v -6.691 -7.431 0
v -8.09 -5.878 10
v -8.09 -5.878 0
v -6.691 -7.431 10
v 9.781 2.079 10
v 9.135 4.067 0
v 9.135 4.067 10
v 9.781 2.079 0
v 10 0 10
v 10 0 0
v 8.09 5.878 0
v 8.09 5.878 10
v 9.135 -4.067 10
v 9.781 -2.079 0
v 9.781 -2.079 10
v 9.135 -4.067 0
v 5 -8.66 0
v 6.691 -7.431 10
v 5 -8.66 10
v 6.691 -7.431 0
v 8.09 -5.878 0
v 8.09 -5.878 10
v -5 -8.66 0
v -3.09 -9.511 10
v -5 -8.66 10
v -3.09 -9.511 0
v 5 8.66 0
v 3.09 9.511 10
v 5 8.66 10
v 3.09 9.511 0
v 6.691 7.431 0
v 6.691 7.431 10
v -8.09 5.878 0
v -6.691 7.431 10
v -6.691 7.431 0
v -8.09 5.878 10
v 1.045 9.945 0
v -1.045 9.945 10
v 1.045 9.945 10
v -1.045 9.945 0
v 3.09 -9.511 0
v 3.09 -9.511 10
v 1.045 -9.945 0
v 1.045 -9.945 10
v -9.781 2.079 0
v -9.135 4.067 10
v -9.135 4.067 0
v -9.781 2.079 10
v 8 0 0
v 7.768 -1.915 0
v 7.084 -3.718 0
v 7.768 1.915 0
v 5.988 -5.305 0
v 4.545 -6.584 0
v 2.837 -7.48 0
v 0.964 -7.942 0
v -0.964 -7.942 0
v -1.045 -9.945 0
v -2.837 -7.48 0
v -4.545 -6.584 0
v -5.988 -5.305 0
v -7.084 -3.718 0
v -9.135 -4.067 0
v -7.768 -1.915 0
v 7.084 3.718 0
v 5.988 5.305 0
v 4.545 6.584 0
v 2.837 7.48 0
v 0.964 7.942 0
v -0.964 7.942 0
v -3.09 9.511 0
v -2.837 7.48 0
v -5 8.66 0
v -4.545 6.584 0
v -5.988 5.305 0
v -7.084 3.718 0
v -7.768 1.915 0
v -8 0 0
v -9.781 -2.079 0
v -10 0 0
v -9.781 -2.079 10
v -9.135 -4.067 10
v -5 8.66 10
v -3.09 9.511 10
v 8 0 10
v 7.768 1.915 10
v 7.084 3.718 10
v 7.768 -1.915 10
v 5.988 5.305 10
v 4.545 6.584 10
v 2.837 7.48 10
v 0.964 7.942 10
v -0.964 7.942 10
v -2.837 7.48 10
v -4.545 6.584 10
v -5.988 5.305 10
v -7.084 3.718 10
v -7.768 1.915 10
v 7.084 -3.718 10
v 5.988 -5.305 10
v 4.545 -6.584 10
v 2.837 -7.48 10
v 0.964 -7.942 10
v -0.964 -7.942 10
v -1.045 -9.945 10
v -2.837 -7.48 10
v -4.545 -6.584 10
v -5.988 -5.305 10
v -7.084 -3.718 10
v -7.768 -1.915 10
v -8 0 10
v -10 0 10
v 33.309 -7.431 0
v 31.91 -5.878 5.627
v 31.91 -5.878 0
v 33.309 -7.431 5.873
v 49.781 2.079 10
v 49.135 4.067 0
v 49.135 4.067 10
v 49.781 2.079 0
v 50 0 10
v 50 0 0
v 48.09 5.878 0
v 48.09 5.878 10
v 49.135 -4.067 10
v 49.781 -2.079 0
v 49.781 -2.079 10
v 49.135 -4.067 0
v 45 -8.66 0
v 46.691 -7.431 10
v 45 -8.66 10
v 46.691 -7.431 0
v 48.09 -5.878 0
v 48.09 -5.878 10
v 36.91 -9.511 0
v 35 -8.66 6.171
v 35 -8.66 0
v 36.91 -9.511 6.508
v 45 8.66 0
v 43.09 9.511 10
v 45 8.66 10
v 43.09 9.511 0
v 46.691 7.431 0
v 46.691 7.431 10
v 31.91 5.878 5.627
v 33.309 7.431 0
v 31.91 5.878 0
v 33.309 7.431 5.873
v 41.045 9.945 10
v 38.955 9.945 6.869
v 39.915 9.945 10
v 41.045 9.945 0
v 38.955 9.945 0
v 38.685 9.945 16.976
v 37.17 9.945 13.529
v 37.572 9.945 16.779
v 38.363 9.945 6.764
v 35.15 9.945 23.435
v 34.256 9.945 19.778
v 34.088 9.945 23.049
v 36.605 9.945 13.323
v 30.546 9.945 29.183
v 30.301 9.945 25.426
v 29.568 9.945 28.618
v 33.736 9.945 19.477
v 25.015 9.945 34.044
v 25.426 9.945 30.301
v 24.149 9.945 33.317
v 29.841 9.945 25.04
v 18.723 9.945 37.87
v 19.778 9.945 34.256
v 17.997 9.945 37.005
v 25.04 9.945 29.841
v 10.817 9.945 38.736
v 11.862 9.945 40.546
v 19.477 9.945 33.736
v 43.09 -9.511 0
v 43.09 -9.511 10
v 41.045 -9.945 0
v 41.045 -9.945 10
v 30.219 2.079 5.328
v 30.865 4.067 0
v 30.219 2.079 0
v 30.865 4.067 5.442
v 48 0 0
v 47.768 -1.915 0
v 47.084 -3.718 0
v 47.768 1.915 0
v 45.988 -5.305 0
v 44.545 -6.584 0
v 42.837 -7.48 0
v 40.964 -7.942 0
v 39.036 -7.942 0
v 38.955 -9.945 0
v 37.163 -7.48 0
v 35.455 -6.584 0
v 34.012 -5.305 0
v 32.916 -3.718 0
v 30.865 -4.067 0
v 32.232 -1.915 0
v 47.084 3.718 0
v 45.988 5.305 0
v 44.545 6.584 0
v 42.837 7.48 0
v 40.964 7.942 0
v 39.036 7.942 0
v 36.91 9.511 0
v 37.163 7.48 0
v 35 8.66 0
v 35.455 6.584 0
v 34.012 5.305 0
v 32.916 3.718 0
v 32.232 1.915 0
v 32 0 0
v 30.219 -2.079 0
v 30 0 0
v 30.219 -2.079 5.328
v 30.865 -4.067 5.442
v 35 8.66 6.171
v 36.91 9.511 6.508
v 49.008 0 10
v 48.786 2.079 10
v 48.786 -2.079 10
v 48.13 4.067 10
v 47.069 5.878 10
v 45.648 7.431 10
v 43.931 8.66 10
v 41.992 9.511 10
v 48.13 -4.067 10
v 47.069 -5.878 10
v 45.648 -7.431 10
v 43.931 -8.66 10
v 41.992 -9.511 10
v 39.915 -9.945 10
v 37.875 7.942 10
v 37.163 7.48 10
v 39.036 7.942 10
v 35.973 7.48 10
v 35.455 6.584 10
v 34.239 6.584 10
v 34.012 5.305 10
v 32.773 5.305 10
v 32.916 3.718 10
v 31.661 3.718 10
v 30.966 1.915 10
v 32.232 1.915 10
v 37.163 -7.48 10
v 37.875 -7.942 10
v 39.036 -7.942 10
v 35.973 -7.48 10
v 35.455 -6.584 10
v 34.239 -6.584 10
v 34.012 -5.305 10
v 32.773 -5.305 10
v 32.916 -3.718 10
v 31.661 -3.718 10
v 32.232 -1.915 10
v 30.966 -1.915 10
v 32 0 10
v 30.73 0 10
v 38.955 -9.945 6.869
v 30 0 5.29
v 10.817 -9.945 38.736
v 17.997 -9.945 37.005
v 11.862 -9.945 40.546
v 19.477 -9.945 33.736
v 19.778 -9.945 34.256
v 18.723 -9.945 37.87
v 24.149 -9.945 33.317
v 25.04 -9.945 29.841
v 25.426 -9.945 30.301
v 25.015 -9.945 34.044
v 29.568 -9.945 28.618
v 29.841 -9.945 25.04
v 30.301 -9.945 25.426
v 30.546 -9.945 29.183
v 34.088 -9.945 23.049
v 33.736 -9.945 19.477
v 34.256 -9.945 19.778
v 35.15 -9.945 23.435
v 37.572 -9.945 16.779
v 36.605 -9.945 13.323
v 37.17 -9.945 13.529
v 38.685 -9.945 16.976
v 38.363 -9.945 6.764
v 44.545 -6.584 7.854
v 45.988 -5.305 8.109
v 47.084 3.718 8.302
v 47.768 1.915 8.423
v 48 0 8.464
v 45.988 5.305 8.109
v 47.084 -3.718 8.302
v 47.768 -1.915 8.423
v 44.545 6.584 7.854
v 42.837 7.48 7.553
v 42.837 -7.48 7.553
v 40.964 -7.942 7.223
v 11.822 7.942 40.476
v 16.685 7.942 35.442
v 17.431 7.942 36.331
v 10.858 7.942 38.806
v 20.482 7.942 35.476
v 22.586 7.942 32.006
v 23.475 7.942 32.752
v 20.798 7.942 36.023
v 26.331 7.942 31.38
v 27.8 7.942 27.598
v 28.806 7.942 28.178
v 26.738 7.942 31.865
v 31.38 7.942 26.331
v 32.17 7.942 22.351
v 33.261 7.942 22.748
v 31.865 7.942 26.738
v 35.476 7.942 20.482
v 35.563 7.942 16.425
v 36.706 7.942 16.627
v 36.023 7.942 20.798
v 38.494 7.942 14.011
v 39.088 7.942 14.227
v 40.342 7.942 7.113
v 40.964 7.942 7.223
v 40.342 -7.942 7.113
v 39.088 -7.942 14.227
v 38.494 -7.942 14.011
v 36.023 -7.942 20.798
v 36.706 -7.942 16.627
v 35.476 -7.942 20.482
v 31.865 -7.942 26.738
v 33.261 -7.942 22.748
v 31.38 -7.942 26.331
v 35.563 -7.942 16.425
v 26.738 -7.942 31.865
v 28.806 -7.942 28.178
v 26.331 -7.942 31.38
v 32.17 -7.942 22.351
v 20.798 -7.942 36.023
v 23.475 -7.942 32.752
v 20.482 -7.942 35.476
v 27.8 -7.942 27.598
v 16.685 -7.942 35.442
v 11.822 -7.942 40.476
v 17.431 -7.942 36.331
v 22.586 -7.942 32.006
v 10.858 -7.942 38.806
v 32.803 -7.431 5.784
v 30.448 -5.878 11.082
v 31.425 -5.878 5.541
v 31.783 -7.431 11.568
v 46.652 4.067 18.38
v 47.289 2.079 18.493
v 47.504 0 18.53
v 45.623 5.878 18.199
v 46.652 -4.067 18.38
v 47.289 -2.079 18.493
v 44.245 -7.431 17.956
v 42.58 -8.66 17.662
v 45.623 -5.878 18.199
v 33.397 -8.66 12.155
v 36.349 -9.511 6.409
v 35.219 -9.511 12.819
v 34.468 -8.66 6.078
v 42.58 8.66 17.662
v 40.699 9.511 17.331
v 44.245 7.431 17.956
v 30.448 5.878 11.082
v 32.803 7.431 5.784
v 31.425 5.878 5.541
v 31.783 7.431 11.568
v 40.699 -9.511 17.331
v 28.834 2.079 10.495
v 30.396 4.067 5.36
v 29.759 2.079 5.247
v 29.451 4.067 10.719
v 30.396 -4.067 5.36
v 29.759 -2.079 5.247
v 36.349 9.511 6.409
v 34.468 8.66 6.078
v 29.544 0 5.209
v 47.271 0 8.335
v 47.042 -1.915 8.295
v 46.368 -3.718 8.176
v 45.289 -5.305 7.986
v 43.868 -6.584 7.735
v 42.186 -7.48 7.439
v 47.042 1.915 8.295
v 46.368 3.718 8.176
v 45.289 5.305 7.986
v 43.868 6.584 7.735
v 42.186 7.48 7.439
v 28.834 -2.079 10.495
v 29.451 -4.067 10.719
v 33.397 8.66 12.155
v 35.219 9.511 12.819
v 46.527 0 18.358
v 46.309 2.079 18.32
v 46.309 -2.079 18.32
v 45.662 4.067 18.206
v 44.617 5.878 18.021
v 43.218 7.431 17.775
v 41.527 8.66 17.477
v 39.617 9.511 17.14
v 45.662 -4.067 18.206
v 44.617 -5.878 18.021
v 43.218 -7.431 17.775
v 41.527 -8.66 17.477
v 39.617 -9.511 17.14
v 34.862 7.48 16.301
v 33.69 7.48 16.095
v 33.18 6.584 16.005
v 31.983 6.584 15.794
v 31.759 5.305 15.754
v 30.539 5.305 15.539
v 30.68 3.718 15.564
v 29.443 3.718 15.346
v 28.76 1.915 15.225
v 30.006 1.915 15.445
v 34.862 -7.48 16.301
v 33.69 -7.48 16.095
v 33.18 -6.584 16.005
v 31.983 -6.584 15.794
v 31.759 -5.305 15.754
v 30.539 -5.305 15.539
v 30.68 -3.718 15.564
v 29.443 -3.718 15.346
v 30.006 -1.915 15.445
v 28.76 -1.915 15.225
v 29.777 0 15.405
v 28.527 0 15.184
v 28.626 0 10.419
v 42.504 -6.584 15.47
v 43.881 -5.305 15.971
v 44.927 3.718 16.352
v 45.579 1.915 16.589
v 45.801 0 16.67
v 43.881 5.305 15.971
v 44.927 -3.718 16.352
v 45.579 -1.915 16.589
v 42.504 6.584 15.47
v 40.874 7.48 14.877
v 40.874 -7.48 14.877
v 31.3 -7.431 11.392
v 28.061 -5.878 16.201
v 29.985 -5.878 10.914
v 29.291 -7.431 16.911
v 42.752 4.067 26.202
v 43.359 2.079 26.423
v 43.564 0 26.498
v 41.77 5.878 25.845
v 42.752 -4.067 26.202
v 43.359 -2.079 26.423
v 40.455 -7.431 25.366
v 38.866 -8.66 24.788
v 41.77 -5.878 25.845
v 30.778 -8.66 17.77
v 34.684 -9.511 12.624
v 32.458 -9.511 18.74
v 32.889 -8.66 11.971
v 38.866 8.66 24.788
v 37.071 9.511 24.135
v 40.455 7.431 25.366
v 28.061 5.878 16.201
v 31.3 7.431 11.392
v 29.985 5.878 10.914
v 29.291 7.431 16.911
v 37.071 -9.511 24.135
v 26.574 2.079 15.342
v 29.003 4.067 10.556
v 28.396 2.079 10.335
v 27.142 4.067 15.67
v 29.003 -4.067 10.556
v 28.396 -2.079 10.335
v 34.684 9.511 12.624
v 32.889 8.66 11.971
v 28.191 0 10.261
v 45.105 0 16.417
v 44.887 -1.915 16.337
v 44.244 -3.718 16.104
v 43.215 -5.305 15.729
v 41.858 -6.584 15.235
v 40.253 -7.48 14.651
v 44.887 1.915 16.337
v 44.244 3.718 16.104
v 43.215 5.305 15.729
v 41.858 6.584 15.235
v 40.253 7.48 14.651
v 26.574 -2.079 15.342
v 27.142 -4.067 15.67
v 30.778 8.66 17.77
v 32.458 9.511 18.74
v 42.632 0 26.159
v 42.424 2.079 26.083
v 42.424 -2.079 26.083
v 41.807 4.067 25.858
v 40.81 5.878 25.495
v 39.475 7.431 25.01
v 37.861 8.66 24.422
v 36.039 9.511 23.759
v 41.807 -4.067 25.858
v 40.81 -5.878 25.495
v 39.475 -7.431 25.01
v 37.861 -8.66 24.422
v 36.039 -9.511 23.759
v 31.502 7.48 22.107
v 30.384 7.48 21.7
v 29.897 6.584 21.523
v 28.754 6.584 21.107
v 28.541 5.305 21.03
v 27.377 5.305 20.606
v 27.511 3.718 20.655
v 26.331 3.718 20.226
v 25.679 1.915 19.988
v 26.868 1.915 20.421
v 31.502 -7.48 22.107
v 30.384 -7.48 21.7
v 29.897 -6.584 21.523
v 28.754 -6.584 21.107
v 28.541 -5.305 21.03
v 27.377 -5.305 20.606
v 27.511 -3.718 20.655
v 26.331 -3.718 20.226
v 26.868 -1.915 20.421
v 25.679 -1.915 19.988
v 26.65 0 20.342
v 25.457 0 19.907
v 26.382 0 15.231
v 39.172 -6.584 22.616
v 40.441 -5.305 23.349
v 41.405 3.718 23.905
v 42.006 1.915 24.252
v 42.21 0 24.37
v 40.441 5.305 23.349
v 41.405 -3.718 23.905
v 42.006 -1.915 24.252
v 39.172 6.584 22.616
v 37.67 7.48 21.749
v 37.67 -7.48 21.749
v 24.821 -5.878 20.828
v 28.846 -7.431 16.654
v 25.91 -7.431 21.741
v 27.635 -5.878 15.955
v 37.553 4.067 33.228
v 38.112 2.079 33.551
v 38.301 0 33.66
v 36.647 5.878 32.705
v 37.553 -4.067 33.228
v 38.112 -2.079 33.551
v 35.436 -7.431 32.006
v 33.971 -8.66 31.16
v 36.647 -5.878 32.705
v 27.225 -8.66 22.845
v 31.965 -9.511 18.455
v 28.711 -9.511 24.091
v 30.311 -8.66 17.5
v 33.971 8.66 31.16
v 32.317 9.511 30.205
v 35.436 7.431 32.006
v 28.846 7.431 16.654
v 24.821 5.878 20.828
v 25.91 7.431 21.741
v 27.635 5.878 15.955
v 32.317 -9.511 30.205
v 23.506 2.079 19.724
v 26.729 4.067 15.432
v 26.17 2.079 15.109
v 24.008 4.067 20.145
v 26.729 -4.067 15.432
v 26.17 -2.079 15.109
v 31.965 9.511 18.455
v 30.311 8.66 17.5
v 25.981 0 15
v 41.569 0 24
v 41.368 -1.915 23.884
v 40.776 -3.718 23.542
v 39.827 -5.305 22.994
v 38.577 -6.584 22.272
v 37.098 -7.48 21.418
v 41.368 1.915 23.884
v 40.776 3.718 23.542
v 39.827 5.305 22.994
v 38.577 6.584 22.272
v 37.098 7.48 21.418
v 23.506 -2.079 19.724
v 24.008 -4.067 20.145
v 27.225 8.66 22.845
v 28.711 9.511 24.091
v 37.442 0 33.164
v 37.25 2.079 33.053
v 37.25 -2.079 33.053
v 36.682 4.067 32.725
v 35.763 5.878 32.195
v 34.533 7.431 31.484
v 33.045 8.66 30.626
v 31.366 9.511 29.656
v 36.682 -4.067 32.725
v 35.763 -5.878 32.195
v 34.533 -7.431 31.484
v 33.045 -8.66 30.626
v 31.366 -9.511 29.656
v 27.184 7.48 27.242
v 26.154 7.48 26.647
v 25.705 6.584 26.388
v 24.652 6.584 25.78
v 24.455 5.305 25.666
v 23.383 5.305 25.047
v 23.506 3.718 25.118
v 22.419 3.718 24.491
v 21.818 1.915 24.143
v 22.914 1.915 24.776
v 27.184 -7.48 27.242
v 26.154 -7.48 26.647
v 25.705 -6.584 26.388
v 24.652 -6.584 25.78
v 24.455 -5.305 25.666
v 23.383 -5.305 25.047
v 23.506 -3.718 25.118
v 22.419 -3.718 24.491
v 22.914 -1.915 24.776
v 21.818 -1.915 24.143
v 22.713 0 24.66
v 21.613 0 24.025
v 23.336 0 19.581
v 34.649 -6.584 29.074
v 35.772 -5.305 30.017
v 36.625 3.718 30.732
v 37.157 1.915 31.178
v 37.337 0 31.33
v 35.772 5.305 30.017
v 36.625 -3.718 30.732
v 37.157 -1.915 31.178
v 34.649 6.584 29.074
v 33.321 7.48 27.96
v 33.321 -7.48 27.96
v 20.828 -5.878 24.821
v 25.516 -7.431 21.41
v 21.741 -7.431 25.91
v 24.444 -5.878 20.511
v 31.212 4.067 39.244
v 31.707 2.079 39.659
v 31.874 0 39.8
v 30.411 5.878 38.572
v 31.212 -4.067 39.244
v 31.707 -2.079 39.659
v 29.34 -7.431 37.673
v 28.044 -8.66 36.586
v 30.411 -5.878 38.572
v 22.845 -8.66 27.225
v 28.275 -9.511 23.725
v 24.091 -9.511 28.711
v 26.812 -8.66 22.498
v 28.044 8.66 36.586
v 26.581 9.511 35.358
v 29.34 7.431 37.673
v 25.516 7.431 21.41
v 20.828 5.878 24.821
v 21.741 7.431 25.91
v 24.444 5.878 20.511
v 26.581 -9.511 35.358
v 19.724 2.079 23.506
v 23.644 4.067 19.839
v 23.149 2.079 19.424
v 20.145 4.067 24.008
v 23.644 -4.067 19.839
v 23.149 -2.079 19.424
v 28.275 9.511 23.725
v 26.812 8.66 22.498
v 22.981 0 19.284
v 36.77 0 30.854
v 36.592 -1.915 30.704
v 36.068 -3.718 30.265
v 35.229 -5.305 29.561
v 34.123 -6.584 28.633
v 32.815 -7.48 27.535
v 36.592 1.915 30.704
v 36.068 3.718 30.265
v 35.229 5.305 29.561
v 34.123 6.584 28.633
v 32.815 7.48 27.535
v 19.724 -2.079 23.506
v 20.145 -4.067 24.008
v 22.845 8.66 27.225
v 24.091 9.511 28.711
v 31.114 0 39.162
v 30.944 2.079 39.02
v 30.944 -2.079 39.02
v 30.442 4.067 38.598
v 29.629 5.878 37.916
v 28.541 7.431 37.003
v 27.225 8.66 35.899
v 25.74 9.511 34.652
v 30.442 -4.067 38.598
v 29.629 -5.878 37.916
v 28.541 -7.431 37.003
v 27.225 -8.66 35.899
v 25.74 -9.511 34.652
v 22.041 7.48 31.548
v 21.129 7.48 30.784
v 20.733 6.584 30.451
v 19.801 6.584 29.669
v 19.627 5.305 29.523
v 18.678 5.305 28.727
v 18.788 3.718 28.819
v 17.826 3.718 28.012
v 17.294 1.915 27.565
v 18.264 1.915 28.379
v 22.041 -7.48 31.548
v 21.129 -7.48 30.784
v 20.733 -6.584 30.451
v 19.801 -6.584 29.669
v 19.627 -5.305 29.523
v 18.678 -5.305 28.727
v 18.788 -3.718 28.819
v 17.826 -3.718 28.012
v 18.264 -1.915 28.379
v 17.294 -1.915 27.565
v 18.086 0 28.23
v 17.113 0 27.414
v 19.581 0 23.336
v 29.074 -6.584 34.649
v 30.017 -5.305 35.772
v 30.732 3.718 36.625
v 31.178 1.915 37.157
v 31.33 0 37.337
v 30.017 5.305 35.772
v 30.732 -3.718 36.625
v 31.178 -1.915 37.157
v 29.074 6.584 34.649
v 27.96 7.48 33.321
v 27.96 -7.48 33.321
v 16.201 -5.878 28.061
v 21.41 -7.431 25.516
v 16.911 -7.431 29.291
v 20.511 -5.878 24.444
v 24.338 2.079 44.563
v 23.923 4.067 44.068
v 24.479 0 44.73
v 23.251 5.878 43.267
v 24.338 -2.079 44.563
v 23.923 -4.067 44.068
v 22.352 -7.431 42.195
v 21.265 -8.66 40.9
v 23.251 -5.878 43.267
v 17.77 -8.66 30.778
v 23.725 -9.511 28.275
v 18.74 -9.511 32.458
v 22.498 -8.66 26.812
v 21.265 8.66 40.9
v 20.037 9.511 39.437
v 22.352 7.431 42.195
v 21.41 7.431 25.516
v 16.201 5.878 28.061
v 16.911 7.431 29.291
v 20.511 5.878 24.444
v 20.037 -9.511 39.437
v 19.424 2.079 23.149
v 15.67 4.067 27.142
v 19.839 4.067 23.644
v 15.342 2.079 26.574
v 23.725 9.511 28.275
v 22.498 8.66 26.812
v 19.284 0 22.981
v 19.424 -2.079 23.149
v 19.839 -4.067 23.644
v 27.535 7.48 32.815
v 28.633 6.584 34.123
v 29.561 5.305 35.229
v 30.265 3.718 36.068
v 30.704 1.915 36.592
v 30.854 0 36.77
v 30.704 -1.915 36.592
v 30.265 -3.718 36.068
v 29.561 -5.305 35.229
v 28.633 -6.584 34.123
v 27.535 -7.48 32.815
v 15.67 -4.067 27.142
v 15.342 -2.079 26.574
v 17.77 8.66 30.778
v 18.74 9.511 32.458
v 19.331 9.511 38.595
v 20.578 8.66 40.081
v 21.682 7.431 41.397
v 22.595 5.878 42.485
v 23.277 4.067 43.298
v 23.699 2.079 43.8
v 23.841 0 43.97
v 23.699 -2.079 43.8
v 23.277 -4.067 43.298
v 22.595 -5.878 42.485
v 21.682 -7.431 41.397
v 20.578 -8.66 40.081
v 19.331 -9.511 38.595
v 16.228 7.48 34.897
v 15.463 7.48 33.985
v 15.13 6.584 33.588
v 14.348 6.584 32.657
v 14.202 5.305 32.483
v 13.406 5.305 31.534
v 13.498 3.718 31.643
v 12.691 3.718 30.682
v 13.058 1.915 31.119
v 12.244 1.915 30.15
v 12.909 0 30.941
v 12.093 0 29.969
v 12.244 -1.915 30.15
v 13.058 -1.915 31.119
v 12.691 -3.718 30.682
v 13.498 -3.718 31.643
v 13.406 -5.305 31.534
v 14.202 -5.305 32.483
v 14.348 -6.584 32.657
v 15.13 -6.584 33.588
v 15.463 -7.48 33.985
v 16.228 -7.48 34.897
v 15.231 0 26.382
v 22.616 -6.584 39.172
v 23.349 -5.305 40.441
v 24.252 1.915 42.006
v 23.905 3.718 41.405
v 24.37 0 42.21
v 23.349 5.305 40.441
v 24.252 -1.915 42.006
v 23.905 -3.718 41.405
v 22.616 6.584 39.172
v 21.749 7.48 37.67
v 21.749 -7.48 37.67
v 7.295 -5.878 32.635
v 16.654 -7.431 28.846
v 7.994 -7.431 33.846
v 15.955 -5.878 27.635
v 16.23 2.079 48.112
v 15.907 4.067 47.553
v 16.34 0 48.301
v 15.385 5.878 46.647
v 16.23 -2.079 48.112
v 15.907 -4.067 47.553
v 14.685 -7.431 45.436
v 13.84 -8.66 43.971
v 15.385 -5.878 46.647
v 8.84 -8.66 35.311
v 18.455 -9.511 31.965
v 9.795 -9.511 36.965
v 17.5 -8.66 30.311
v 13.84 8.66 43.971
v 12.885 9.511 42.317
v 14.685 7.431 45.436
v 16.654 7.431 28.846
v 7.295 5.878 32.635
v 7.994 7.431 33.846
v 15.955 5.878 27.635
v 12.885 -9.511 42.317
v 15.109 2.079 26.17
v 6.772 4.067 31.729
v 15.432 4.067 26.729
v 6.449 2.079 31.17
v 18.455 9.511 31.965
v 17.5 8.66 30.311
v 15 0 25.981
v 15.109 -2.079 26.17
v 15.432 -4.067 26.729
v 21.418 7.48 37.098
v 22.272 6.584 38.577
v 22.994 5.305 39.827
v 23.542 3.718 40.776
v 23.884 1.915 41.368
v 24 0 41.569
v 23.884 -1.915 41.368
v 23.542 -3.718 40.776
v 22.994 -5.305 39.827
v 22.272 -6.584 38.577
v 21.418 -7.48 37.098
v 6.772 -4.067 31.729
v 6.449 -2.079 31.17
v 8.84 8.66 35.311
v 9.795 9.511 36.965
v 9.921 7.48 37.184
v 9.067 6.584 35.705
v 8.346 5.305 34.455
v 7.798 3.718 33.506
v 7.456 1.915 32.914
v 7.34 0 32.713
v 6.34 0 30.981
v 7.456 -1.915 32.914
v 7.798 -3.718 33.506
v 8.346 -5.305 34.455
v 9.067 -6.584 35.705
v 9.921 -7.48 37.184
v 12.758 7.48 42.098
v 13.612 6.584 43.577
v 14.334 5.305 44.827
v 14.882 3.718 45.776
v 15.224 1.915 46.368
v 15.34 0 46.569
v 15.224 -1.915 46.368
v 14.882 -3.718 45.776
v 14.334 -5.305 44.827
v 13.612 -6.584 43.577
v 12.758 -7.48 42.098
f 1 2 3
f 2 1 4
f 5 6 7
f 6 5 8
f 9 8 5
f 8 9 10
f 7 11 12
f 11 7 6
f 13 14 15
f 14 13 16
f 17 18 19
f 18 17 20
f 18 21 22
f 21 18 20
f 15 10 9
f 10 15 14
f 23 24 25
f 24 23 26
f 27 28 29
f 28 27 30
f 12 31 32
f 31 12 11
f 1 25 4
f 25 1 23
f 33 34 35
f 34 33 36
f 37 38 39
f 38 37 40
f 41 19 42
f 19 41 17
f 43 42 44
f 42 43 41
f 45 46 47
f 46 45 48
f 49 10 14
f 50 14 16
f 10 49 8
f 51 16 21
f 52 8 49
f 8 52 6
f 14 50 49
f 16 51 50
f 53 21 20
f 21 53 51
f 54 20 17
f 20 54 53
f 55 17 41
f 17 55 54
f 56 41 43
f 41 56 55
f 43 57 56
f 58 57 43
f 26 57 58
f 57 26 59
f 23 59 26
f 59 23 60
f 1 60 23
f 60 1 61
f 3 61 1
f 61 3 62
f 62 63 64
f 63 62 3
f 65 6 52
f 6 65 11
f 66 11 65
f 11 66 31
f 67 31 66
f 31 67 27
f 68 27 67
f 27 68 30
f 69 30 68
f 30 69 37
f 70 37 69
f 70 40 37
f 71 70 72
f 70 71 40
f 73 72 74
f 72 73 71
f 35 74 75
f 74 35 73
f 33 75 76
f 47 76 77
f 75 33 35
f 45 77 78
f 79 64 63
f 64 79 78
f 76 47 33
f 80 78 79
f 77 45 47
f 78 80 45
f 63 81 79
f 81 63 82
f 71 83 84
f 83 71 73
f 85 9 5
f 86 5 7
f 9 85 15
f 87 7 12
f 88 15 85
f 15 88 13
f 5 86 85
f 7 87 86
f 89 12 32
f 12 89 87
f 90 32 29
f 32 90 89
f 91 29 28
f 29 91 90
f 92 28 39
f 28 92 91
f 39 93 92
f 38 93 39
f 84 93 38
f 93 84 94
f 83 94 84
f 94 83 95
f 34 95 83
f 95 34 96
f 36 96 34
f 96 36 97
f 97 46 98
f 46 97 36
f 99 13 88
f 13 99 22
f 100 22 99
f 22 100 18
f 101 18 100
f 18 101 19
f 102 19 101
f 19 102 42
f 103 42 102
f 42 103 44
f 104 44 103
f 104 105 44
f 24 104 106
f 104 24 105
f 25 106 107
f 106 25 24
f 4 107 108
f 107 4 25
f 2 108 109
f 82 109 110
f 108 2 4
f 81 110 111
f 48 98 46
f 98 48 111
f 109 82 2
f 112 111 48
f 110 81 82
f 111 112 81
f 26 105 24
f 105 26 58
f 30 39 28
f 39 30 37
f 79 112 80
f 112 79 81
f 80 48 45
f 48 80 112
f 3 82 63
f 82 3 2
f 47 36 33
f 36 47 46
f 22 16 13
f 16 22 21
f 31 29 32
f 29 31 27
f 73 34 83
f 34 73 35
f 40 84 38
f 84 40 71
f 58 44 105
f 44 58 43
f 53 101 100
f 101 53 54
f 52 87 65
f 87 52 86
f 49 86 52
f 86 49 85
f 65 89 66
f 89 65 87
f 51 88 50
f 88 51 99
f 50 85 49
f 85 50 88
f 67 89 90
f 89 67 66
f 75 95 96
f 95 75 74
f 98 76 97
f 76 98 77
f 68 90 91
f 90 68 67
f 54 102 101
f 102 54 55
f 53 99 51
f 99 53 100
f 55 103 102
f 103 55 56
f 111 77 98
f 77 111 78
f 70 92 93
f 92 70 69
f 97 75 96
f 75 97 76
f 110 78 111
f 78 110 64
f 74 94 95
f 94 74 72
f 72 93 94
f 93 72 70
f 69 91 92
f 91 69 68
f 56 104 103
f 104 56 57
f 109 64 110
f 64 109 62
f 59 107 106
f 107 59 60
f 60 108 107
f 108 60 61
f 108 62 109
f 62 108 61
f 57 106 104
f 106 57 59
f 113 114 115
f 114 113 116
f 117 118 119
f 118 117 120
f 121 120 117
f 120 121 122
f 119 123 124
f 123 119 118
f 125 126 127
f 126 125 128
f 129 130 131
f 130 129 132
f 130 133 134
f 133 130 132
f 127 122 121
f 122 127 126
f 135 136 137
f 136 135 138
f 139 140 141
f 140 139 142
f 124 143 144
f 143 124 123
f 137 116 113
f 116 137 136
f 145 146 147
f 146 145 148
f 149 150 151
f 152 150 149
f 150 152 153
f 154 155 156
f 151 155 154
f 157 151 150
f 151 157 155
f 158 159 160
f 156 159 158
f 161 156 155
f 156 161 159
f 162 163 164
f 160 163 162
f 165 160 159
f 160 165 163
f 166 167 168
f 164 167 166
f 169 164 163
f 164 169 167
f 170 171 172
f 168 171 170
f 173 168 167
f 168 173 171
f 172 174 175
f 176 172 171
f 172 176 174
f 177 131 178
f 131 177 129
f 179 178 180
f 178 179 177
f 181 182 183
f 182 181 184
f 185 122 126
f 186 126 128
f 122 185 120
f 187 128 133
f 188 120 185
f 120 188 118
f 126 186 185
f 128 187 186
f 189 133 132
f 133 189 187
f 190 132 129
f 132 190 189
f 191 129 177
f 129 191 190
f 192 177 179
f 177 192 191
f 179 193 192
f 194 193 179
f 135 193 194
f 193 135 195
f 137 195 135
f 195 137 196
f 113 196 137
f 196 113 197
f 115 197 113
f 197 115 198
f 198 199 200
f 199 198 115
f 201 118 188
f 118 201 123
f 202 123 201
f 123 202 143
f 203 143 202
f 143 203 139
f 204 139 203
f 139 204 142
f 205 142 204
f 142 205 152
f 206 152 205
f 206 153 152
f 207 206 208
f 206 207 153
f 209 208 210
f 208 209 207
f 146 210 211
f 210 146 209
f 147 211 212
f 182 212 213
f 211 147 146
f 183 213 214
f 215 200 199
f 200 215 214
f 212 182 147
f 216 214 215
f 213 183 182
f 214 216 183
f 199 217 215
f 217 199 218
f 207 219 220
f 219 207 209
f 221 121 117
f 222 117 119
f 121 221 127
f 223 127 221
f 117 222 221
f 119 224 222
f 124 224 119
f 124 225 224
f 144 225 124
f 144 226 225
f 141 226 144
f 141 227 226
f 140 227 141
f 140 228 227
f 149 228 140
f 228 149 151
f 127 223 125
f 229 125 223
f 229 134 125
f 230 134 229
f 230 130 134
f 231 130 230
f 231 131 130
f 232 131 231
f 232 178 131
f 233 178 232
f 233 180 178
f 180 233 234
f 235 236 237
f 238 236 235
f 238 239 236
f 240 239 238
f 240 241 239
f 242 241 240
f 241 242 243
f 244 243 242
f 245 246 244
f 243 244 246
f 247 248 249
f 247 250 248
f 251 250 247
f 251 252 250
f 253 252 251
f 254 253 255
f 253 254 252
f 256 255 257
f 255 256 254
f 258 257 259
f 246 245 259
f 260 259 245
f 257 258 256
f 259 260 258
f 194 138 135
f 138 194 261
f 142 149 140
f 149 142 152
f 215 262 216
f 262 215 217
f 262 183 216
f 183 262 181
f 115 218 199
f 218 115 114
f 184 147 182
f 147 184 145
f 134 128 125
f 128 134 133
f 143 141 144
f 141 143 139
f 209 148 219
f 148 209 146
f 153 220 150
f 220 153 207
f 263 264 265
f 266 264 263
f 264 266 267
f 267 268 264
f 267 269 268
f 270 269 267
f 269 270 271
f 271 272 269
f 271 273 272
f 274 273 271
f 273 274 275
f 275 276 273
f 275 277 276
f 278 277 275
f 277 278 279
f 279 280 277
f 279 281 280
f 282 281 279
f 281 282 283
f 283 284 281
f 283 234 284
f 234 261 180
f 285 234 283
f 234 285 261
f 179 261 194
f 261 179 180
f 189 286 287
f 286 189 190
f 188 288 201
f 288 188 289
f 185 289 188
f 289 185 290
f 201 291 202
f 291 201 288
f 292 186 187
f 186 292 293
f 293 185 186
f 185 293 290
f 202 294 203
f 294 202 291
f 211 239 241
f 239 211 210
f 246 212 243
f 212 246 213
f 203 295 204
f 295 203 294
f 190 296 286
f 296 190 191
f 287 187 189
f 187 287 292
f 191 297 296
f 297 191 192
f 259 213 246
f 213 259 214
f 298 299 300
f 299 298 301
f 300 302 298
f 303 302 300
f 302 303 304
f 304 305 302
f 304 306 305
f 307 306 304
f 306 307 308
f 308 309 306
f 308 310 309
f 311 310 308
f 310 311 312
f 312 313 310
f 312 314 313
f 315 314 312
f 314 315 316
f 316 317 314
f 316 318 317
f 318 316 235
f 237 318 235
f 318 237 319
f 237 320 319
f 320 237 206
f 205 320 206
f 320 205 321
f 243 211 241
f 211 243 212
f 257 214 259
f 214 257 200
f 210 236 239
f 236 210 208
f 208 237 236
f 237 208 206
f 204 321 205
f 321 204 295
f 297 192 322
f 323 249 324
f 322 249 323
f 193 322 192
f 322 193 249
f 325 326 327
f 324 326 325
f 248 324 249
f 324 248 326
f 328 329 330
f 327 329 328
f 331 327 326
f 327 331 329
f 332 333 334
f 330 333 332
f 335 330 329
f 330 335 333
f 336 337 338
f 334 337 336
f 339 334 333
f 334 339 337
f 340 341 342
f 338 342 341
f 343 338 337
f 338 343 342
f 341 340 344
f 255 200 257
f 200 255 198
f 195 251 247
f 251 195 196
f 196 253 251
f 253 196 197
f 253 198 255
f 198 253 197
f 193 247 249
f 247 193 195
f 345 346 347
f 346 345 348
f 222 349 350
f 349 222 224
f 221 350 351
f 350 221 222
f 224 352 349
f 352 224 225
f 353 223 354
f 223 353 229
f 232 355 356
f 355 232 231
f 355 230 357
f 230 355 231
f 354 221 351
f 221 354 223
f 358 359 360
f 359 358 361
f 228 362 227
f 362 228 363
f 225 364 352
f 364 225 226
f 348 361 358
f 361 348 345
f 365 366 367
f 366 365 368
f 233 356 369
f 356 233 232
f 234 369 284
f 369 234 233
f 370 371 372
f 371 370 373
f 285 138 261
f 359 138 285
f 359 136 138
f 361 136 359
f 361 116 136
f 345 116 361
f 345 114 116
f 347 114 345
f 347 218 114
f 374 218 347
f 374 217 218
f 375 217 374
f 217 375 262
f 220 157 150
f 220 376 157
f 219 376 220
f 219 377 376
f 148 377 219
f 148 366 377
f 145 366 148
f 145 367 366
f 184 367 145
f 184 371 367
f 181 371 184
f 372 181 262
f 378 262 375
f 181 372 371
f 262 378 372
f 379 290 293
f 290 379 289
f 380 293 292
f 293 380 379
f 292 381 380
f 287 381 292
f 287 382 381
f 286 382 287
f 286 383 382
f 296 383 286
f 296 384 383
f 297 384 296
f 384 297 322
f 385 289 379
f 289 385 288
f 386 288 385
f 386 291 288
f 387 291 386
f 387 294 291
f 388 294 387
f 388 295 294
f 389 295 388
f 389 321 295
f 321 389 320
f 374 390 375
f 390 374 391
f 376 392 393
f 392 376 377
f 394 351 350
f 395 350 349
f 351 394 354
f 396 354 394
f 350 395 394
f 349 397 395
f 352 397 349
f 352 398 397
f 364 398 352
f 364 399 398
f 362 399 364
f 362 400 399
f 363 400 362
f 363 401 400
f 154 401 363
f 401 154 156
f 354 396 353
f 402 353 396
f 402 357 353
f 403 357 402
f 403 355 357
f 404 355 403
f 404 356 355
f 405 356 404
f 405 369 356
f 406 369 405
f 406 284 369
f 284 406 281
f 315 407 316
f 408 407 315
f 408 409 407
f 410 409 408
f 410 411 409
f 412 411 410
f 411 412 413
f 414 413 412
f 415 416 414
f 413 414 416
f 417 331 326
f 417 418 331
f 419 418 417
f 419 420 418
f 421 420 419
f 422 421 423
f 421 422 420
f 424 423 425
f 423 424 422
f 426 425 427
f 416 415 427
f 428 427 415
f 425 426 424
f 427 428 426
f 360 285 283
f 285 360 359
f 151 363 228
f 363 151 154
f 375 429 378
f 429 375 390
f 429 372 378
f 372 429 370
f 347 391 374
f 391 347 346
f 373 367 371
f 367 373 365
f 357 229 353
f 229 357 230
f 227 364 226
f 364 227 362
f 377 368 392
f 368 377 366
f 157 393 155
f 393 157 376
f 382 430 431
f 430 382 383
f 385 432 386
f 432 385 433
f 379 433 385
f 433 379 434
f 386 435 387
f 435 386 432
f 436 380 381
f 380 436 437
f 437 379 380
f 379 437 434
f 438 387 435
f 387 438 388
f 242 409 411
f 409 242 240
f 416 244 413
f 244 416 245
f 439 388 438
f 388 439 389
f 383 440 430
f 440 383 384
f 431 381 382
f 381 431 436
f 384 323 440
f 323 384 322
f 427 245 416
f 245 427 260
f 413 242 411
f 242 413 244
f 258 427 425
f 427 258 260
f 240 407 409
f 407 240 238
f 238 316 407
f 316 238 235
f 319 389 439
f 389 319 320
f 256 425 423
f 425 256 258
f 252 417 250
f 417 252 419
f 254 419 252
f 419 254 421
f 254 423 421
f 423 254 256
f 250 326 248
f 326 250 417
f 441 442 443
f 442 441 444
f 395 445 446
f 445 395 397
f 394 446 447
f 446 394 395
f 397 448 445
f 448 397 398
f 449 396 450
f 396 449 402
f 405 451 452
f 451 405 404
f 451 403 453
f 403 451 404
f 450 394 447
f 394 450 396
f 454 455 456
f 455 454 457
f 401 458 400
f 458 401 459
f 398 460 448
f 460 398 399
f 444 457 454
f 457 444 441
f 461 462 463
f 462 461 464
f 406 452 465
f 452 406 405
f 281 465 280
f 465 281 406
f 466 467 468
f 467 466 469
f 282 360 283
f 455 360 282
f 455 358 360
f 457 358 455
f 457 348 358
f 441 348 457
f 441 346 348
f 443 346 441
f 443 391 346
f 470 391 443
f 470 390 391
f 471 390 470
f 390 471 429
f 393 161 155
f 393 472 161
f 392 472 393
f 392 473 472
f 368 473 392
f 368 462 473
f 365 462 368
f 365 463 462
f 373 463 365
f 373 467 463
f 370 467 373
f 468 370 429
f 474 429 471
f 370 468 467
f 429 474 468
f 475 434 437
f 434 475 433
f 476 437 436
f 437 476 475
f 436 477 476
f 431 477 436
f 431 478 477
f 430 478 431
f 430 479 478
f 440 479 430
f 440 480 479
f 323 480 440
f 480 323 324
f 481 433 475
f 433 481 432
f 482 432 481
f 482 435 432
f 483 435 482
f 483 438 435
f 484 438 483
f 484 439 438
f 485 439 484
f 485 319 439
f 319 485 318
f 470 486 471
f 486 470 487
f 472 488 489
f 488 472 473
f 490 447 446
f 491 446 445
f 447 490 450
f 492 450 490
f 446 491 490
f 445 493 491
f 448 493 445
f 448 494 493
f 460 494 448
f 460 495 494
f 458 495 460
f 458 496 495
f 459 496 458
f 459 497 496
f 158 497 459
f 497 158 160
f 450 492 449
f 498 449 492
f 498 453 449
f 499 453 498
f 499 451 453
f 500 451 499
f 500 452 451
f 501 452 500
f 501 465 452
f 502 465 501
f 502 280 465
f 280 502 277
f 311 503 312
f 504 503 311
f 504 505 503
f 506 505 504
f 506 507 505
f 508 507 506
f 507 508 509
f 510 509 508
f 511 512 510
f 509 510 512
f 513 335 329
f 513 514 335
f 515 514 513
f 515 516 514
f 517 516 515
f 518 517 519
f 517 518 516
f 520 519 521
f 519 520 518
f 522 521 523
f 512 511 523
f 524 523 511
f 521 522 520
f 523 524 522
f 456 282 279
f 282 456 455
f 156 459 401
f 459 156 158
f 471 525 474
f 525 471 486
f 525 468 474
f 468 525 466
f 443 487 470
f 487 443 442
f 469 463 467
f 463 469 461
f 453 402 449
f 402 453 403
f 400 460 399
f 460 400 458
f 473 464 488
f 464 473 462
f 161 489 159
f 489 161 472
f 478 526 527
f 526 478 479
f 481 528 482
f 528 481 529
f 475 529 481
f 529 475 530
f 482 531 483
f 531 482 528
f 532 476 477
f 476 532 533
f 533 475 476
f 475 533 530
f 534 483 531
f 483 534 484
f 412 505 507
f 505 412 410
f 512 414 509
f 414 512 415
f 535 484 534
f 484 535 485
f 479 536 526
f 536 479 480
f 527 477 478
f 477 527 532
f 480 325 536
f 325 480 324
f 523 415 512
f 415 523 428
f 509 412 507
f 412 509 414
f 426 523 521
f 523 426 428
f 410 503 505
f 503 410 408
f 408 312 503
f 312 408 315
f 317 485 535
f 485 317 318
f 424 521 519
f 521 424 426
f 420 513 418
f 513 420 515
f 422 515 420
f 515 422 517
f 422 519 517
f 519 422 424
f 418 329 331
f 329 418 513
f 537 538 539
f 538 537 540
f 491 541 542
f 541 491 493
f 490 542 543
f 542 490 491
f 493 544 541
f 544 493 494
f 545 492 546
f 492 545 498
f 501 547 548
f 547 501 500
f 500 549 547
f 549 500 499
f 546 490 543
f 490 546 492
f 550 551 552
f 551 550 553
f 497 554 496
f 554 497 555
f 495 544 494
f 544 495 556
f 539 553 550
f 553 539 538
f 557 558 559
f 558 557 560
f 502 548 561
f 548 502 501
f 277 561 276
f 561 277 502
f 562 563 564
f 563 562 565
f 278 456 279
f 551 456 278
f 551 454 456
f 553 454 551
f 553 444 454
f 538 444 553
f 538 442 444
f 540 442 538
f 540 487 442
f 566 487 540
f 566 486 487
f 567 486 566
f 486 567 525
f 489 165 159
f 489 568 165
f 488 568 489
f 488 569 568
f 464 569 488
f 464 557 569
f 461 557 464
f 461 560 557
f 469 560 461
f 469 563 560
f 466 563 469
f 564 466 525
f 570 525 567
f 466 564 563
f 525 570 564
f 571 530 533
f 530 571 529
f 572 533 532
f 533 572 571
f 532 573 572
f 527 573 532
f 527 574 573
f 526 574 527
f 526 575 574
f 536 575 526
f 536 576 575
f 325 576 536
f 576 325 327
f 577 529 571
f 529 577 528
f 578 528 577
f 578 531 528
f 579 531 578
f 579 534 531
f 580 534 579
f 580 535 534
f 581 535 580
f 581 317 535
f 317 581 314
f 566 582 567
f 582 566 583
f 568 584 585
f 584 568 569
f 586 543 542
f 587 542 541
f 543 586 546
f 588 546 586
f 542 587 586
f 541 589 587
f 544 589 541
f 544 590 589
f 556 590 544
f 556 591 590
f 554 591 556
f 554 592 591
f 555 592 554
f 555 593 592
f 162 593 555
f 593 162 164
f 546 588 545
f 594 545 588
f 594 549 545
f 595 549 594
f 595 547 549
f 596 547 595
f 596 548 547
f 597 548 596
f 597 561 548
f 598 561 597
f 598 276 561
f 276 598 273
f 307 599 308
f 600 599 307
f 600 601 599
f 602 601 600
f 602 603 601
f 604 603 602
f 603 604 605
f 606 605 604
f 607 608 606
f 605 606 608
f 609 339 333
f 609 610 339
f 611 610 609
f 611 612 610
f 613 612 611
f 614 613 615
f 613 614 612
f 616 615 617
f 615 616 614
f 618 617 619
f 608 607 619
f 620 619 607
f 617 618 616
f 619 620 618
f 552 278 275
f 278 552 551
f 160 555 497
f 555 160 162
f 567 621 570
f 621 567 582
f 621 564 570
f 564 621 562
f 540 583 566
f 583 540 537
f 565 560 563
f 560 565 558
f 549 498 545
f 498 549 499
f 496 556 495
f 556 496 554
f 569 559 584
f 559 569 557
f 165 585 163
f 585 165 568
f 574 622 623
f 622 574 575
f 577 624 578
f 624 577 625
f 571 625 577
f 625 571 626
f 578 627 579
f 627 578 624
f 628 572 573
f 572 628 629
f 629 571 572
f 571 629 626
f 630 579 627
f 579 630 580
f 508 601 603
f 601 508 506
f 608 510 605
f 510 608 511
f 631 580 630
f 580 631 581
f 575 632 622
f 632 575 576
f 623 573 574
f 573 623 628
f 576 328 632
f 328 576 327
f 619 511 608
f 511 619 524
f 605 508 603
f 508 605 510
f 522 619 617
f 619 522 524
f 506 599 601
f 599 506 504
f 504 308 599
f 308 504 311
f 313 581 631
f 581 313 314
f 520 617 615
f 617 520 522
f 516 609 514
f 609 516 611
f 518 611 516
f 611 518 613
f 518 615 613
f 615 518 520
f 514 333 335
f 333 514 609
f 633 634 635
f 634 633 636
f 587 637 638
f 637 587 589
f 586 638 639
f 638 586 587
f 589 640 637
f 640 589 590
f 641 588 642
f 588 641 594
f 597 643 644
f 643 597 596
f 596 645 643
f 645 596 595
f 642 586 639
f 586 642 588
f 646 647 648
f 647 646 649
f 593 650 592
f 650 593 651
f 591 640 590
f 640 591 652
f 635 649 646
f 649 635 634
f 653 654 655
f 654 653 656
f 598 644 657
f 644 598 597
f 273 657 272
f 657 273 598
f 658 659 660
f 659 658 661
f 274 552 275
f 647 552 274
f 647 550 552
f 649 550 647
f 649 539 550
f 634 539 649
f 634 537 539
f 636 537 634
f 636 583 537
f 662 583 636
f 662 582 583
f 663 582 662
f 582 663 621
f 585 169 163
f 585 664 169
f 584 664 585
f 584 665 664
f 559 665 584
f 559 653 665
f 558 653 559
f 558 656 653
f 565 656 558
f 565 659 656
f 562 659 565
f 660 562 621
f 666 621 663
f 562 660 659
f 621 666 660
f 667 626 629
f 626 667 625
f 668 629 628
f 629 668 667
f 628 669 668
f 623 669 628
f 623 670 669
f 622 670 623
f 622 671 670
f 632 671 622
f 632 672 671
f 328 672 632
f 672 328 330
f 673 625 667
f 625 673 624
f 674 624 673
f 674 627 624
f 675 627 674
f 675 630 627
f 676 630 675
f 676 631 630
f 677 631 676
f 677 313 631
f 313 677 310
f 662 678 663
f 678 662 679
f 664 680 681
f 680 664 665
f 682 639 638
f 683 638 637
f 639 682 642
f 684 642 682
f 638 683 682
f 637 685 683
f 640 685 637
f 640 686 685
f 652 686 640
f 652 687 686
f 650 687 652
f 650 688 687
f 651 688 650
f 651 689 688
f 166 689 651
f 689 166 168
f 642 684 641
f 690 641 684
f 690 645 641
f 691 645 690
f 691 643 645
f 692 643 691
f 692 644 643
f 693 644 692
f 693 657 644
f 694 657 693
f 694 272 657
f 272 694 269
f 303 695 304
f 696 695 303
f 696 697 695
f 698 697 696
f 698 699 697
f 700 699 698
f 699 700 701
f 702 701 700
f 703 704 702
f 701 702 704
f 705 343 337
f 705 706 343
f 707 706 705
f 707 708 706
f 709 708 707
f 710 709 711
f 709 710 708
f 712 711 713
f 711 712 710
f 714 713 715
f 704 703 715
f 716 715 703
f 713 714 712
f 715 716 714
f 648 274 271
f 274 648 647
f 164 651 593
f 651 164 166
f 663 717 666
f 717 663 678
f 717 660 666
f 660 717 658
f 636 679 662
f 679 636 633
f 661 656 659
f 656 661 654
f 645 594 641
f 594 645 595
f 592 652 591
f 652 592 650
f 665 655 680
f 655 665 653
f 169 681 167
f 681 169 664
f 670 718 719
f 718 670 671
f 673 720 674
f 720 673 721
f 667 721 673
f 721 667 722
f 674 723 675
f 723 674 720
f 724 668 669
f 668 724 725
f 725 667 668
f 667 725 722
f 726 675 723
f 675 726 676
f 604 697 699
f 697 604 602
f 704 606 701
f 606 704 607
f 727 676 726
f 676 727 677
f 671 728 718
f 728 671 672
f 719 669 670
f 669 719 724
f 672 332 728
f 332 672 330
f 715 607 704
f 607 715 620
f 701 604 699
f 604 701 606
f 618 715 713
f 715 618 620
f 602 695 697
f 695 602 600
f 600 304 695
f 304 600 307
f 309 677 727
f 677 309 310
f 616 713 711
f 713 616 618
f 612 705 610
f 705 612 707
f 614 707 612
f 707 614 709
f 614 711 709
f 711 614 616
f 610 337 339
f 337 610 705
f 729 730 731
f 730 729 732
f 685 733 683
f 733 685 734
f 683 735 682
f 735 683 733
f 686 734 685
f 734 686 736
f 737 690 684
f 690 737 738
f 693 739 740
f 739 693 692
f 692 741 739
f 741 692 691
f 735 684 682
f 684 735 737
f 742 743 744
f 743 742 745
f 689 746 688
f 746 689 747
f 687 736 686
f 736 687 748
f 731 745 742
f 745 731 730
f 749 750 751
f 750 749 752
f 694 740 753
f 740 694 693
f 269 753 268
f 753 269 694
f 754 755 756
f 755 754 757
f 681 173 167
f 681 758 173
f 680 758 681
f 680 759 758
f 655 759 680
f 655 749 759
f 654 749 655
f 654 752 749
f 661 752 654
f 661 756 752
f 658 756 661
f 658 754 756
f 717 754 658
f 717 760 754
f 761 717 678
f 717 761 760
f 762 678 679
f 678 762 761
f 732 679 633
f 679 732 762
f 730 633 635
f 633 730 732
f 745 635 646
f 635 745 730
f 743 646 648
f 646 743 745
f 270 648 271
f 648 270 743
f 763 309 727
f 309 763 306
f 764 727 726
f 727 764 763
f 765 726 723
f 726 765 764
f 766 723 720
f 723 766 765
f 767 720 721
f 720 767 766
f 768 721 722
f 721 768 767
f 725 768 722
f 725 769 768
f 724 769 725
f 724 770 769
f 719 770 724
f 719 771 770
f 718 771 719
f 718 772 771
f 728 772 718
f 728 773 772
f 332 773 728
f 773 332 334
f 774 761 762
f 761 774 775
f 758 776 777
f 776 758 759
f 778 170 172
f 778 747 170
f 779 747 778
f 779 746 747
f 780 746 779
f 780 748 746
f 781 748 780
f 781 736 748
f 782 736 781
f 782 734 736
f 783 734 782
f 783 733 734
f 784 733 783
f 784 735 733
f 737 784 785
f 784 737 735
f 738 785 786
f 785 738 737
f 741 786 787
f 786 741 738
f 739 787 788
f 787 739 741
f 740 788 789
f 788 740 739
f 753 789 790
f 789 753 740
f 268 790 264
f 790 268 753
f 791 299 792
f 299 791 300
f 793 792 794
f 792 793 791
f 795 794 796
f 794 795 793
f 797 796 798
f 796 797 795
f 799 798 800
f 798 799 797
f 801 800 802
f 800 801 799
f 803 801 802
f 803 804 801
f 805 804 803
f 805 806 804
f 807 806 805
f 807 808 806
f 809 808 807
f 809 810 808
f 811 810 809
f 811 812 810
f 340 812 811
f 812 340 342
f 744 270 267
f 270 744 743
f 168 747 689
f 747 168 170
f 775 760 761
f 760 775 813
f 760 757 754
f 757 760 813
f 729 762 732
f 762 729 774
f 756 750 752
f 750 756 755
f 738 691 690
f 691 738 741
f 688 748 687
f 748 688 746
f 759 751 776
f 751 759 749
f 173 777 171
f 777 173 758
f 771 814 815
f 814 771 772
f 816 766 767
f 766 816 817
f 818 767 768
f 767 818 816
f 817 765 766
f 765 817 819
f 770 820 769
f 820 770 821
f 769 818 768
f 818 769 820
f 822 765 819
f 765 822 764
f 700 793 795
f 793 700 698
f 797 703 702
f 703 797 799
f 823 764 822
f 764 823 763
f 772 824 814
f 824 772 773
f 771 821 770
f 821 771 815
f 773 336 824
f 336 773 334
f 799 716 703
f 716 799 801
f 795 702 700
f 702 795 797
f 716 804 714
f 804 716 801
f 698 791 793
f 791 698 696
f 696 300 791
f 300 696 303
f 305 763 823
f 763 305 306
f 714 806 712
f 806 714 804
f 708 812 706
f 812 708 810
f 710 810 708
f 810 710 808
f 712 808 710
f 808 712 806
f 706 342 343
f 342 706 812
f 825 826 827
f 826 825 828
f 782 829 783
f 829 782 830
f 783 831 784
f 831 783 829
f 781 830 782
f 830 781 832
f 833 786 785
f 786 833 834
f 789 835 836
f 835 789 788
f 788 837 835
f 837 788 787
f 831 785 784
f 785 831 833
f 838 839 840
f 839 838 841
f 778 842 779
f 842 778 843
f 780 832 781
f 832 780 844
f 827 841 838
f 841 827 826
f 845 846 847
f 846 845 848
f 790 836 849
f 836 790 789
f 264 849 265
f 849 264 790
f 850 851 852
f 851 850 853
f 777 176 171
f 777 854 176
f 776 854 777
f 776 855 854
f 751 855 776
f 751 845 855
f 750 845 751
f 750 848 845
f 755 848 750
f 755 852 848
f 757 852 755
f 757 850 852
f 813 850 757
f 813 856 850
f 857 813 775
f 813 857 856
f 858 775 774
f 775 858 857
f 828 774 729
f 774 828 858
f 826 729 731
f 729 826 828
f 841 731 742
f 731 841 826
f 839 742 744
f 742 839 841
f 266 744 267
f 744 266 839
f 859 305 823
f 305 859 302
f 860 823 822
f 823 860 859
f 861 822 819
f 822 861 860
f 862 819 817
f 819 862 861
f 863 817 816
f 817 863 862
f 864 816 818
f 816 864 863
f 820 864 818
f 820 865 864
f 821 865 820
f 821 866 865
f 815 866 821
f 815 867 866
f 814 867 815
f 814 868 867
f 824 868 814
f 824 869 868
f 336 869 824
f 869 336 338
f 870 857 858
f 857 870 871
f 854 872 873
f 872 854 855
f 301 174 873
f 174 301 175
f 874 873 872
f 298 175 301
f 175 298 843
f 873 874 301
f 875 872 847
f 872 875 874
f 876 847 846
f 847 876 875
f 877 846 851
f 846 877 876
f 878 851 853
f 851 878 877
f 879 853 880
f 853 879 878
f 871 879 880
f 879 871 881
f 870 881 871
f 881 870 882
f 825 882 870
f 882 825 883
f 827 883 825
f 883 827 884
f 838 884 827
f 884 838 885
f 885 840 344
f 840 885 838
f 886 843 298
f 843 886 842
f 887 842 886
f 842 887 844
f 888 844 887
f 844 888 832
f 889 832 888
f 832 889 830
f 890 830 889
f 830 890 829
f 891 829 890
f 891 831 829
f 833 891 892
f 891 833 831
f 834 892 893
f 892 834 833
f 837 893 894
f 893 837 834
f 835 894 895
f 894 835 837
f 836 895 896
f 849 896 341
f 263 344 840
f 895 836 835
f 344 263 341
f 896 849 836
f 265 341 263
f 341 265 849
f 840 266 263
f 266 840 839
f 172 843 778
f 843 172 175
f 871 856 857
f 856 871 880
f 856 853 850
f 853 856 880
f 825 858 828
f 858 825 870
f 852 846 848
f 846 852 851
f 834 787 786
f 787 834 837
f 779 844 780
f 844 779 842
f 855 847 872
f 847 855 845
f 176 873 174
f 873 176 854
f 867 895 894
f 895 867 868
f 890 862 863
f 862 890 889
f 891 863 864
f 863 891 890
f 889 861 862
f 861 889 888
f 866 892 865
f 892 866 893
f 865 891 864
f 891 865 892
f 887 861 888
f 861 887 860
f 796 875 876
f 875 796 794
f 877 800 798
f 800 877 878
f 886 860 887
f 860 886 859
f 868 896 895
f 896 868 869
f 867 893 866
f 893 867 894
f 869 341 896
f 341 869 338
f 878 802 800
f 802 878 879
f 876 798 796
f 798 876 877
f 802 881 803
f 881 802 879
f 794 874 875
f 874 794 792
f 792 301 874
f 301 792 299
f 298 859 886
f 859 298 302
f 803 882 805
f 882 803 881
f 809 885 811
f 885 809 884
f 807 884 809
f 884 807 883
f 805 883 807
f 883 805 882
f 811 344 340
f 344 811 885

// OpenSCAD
//===============================================================
/*
 //example for()  loops ....multi line vs single liner

 color_vec = ["black","red","blue","green","pink","purple"];
 
 // 3 separate for's
 
 for (x = [-20:10:20] )
 for (y = [0:4] )color(color_vec[y])
 for (z = [0,4,10] )
     {translate([x,y*5-10,z])cube();}
 
// single 'for' with implicit multiple 'for's"
 
 for (x = [-20:10:20], y = [0:4], z = [0,4,10] )
     translate([x,y*5-10,z])
     {color(color_vec[y])cube();}
*/     
//===============================================================
/*     
// iteratate a list using for

// NOTICE : all objects inside the for loop will be UNIONED  
for(i = [ [ 0,  0,  0],
          [10, 12, 10],
          [20, 24, 20],
          [30, 36, 30],
          [20, 48, 40],
          [10, 60, 50] ])
{
   translate(i)
   color("RED")
   cube([50, 15, 10], center = true);
}

// iterate over vectors of vectors
// example 3 - iteration over a vector of vectors
// NOTICE : all objects inside the for loop will be UNIONED  

for(i = [ [[ 0,  0,  0], 20],
          [[10, 12, 10], 50],
          [[20, 24, 20], 70],
          [[30, 36, 30], 10],
          [[20, 48, 40], 30],
          [[10, 60, 50], 40] ])
{
  translate([i[0][0], 2*i[0][1], 0])  // notice [0][1]
  color("GREEN")
  cube([10, 15, i[1]]);
}
*/
//===============================================================     
/*
// intersection_for is the INTERSECTION of all objects created in the "FOR"
// hard to see effect in preview.... use render not preview
color("GREEN")
intersection_for(n = [1 : 4])
{
    rotate([0, 0, n * 90])
    {
        translate([6,0,0])
        sphere(r=12);
    }
}

// simpple FOR with same commands is a UNION
color("RED")
translate([35, 0, 0])
for(n = [1 : 4])
{
    rotate([0, 0, n * 90])
    {
        translate([6,0,0])
        sphere(r=12);
    }
}
*/
//===============================================================     
/*
// ANIMATION
// it is controlled by the variable $t
// uses the 'Animate' toolbar in openscad
// makes one "STEP" at the "FPS" rate... REMEMBER TO SET THEM.
//
// below will rotate a ball like hands on a clock.
rotate([0,0,-$t*360])
{
    color("RED")
    translate([50,0,0])
    sphere(10);
}
*/


// TRANSFORMS ===============================================================
// https://en.wikibooks.org/wiki/OpenSCAD_User_Manual/Transformations

// make a cylinder with a cube nub.
module Obj() {
    difference()
    {
        union()
        {
            cylinder(r=10.0,h=10,center=false);
            //cube(size=[10,10,10],center=false);
        }

        translate([ 0, 0, -.1]) 
        cylinder(r=8,h=10.2,center=false);
        //cube(size=[8,8,8],center=false);
    }
}

// This itterates into the future 6 times and demonstrates 
// how multimatrix is moving the object around the center point


for(time = [0 : 10 : 60])
{
    y_ang=-time;

    mrot_y = [ [ cos(y_ang), 0,  sin(y_ang), 0],
               [         0,  1,           0, 0],
               [-sin(y_ang), 0,  cos(y_ang), 0],
               [         0,  0,           0, 1]
             ];
    mtrans_x = [ [1, 0, 0, 40],
                 [0, 1, 0,  0],
                 [0, 0, 1,  0],
                 [0, 0, 0,  1]
               ];

    echo(mrot_y*mtrans_x);
    
    // This is the object at [0,0,0]
    color("BLUE")
    Obj();
    
    // This is the starting object at the [40,0,0] coordinate
    color("GREEN")
    multmatrix(mtrans_x) Obj();
    
     // TRANSLATION and ROTATION TOGETHER.
     // so its rotation of an object ABOUT A DISTANT POINT
     //This is the one rotating and appears 6 times
    color("RED")
    multmatrix(mrot_y * mtrans_x) Obj();
};

//00000000000000000000000000000000000000000000000000000000
// passing in a object
/*
module peg(action)
{
  if(action=="position")
  {
    for(r=[0:90:359])
      rotate([0,0,r])
        translate([screw_dist/2,screw_dist/2,0])
        {
         for(i=[0:$children-1])
           children(i); // do the shapes that come after us!
        }
  }
  ...
*/
